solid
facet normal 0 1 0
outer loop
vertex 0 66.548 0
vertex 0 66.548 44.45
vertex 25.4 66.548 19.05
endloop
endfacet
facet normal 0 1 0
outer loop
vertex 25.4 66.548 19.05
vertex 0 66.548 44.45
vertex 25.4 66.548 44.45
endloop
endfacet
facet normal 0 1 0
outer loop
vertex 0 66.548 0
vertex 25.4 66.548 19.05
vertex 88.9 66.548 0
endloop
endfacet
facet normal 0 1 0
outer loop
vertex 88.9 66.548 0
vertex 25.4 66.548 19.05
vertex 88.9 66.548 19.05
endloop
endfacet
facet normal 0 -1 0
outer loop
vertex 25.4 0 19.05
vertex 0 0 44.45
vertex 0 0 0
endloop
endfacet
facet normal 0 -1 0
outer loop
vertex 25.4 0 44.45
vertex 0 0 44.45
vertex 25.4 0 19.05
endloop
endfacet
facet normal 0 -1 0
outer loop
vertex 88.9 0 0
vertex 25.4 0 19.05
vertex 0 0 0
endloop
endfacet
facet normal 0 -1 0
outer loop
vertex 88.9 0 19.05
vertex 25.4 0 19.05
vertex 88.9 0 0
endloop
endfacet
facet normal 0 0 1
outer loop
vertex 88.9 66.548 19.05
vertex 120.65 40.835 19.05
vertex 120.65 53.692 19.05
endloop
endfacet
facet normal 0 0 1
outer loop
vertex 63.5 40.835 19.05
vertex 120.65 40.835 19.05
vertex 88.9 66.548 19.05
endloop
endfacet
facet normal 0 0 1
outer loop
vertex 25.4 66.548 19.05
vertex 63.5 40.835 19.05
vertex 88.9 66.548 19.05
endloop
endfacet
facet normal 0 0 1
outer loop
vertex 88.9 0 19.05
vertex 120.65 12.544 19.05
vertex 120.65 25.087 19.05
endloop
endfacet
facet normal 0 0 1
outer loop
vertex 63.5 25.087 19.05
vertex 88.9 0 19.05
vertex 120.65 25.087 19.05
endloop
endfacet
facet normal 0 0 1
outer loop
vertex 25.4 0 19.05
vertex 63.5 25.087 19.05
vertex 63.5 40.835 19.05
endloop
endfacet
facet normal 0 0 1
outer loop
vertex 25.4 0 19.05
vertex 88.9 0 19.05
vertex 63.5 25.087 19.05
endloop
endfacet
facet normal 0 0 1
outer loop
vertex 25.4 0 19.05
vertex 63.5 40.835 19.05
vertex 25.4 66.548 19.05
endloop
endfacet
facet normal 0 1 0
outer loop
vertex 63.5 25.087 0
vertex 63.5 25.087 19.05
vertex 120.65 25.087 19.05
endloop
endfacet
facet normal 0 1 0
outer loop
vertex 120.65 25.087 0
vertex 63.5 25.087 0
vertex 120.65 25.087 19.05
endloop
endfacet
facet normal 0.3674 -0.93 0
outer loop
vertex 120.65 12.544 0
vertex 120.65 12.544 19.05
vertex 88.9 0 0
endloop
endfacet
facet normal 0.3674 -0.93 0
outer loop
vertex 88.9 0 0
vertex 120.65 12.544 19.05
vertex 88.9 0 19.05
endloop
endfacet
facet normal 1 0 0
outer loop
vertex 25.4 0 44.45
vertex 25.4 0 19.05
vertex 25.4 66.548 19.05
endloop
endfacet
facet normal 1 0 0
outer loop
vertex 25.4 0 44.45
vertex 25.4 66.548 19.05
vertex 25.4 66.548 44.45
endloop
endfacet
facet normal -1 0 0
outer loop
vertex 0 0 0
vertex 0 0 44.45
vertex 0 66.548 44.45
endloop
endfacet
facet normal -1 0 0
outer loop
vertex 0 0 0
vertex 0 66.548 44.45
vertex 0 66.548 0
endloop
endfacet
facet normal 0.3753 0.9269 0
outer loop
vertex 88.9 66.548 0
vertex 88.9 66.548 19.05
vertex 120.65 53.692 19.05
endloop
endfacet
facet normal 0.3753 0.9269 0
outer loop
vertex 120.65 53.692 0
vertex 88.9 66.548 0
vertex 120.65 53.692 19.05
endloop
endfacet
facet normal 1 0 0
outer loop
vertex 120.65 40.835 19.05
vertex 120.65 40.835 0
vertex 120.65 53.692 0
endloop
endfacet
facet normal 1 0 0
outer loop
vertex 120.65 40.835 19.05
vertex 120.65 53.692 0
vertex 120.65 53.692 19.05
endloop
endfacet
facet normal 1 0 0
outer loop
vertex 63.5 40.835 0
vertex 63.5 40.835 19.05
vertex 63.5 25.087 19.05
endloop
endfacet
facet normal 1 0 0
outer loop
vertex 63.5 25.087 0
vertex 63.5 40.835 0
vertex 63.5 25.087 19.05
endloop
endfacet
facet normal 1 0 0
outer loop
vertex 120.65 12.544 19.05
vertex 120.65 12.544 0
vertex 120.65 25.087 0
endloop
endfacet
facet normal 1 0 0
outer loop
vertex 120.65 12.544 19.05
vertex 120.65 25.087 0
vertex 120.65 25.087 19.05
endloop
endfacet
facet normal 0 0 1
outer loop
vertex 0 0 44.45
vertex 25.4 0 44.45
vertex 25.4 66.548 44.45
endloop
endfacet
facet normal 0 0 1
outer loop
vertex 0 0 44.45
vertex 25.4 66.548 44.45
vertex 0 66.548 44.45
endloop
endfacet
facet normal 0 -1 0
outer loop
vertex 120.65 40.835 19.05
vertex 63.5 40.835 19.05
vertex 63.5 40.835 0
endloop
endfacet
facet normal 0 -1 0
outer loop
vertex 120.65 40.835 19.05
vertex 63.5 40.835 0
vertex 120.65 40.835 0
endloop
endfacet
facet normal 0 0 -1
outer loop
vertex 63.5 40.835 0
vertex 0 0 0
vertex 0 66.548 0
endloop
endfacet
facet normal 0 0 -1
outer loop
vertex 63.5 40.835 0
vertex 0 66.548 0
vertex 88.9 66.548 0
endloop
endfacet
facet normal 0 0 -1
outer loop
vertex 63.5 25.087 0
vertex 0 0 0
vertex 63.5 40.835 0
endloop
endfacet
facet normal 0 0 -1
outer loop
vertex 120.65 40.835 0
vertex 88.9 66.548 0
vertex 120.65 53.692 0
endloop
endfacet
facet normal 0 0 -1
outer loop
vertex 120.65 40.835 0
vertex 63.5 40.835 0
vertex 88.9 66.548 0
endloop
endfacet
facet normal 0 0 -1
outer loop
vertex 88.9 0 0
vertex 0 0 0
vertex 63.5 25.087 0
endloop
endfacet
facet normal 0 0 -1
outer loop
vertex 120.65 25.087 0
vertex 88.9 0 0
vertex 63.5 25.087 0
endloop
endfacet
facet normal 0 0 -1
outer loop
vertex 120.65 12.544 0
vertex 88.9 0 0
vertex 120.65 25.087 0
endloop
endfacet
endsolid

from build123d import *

# Parameters (mm, degrees)
F1_DEPTH = 66.548
F2_W     = 57.15
F2_H     = 8.186824
F2_H_2   = 7.561176
F3_DEPTH = 19.051
F5_DEPTH = 19.051


with BuildPart() as f1:
    # F0 (on Front) → F1 (new body)
    with BuildSketch(Plane.XZ):
        Polygon((0, 44.45), (0, 0), (120.65, 0), (120.65, 19.05), (25.4, 19.05), (25.4, 44.45), align=None)
    extrude(amount=-F1_DEPTH)

    # F2 (on face) → F3 (cut, through all)
    with BuildSketch(Plane.XY.offset(19.05)):
        with Locations((92.075, 29.180588)):
            Rectangle(F2_W, F2_H)
        with Locations((92.075, 37.054588)):
            Rectangle(F2_W, F2_H_2)
    extrude(amount=-F3_DEPTH, mode=Mode.SUBTRACT)

    # F4 (on face) → F5 (cut, through all)
    with BuildSketch(Plane.XY.offset(19.05)):
        Polygon((88.9, 0), (120.65, 0), (120.65, 12.543588), align=None)
        Polygon((120.65, 53.691588), (120.65, 66.548), (88.9, 66.548), align=None)
    extrude(amount=-F5_DEPTH, mode=Mode.SUBTRACT)


solid = f1.part
